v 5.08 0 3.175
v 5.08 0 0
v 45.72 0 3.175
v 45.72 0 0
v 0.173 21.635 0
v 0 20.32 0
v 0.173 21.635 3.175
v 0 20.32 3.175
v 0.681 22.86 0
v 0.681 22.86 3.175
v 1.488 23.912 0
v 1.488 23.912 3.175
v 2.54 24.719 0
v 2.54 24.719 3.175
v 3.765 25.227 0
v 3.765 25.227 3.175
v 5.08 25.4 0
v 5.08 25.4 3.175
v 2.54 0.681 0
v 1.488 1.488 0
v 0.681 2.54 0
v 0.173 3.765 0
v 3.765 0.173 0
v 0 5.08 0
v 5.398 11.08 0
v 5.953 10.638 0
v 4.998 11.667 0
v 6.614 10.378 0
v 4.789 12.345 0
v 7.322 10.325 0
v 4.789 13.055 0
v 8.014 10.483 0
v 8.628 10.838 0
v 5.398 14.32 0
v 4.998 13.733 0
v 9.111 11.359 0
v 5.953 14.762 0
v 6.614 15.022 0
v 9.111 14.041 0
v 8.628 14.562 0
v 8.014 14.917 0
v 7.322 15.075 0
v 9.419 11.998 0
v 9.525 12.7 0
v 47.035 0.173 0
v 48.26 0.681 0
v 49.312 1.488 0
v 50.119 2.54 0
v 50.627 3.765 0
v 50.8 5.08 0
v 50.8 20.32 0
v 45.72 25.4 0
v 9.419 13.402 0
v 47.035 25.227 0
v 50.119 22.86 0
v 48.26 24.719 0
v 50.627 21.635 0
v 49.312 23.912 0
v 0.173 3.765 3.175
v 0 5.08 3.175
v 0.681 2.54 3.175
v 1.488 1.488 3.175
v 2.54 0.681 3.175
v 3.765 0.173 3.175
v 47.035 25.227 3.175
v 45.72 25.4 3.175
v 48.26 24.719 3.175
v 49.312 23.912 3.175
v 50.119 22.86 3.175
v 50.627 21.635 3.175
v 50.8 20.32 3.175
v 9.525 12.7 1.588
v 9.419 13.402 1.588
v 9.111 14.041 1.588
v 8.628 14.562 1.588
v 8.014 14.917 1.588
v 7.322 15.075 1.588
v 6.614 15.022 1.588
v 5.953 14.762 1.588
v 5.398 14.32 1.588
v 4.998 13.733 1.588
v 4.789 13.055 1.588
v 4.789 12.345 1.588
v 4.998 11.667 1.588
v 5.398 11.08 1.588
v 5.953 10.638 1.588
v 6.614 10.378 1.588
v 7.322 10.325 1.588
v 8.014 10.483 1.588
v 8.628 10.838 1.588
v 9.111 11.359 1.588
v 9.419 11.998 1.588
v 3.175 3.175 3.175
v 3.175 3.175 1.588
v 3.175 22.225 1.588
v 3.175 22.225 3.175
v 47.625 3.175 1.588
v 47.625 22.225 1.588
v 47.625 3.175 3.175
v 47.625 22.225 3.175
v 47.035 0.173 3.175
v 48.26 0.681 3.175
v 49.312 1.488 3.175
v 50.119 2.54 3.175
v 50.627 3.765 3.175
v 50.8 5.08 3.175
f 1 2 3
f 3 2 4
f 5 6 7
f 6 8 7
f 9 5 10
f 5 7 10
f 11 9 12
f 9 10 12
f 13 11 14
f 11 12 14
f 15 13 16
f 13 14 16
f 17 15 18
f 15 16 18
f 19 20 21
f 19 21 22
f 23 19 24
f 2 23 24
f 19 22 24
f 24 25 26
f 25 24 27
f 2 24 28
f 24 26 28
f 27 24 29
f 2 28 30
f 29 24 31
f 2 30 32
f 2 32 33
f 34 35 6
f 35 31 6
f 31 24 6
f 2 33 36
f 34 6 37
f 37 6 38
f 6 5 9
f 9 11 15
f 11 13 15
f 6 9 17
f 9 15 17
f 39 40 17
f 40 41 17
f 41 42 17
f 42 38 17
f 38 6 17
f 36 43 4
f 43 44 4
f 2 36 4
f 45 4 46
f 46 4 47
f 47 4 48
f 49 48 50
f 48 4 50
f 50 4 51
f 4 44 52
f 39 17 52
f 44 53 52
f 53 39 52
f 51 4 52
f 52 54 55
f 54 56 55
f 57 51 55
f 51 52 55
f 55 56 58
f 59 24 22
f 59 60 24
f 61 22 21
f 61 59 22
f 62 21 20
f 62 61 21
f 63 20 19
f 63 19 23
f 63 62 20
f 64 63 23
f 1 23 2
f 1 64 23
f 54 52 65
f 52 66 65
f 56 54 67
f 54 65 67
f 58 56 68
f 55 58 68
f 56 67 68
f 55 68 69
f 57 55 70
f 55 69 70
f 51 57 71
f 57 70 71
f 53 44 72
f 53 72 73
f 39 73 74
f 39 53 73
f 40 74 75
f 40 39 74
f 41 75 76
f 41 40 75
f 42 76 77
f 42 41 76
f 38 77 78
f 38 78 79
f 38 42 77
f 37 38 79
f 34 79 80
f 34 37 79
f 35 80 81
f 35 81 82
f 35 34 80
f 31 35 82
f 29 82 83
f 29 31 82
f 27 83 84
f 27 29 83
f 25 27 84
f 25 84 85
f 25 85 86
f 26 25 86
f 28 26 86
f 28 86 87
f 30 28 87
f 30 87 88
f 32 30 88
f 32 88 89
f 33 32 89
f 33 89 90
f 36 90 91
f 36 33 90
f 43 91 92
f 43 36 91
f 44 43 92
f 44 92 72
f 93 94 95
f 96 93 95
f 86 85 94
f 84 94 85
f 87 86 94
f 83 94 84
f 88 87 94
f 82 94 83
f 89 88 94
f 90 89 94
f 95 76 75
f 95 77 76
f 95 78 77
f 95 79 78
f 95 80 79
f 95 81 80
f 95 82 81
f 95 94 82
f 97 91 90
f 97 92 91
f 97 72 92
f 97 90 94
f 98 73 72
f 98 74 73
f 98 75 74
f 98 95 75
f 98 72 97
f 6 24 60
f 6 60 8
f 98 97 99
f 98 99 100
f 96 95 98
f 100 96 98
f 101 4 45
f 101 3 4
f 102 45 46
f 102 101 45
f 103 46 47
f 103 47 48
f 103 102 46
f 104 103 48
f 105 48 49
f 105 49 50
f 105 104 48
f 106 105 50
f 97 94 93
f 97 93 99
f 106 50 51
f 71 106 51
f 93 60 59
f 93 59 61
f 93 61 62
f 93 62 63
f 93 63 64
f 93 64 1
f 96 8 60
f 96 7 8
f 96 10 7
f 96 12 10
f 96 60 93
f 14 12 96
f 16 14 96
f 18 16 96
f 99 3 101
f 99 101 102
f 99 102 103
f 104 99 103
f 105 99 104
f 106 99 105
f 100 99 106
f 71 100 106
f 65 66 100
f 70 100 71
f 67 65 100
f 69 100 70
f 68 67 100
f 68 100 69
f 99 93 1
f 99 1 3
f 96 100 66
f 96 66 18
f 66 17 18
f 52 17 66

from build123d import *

# Parameters (mm, degrees)
F0_W     = 44.45
F0_H     = 19.05
F0_R     = 2.38125
F1_DEPTH = 1.5875
F0_W_2   = 50.8
F0_H_2   = 25.4
F2_DEPTH = 3.175
F3_R     = 5.08


with BuildPart() as f1:
    # F0 (on Top) → F1 (new body)
    with BuildSketch(Plane.XY):
        with Locations((25.4, 12.7)):
            Rectangle(F0_W, F0_H)
        with Locations((7.14375, 12.7)):
            Circle(F0_R, mode=Mode.SUBTRACT)
    extrude(amount=F1_DEPTH)

    # F0 (on Top) → F2 (join)
    with BuildSketch(Plane.XY):
        with Locations((25.4, 12.7)):
            Rectangle(F0_W_2, F0_H_2)
        with Locations((25.4, 12.7)):
            Rectangle(F0_W, F0_H, mode=Mode.SUBTRACT)
    extrude(amount=F2_DEPTH)

    # F3
    f3_edges = [f1.edges().sort_by_distance(p)[0] for p in [
        (50.8, 0, 1.5875),
        (50.8, 25.4, 1.5875),
        (0, 0, 1.5875),
        (0, 25.4, 1.5875),
    ]]
    fillet(f3_edges, radius=F3_R)


solid = f1.part
